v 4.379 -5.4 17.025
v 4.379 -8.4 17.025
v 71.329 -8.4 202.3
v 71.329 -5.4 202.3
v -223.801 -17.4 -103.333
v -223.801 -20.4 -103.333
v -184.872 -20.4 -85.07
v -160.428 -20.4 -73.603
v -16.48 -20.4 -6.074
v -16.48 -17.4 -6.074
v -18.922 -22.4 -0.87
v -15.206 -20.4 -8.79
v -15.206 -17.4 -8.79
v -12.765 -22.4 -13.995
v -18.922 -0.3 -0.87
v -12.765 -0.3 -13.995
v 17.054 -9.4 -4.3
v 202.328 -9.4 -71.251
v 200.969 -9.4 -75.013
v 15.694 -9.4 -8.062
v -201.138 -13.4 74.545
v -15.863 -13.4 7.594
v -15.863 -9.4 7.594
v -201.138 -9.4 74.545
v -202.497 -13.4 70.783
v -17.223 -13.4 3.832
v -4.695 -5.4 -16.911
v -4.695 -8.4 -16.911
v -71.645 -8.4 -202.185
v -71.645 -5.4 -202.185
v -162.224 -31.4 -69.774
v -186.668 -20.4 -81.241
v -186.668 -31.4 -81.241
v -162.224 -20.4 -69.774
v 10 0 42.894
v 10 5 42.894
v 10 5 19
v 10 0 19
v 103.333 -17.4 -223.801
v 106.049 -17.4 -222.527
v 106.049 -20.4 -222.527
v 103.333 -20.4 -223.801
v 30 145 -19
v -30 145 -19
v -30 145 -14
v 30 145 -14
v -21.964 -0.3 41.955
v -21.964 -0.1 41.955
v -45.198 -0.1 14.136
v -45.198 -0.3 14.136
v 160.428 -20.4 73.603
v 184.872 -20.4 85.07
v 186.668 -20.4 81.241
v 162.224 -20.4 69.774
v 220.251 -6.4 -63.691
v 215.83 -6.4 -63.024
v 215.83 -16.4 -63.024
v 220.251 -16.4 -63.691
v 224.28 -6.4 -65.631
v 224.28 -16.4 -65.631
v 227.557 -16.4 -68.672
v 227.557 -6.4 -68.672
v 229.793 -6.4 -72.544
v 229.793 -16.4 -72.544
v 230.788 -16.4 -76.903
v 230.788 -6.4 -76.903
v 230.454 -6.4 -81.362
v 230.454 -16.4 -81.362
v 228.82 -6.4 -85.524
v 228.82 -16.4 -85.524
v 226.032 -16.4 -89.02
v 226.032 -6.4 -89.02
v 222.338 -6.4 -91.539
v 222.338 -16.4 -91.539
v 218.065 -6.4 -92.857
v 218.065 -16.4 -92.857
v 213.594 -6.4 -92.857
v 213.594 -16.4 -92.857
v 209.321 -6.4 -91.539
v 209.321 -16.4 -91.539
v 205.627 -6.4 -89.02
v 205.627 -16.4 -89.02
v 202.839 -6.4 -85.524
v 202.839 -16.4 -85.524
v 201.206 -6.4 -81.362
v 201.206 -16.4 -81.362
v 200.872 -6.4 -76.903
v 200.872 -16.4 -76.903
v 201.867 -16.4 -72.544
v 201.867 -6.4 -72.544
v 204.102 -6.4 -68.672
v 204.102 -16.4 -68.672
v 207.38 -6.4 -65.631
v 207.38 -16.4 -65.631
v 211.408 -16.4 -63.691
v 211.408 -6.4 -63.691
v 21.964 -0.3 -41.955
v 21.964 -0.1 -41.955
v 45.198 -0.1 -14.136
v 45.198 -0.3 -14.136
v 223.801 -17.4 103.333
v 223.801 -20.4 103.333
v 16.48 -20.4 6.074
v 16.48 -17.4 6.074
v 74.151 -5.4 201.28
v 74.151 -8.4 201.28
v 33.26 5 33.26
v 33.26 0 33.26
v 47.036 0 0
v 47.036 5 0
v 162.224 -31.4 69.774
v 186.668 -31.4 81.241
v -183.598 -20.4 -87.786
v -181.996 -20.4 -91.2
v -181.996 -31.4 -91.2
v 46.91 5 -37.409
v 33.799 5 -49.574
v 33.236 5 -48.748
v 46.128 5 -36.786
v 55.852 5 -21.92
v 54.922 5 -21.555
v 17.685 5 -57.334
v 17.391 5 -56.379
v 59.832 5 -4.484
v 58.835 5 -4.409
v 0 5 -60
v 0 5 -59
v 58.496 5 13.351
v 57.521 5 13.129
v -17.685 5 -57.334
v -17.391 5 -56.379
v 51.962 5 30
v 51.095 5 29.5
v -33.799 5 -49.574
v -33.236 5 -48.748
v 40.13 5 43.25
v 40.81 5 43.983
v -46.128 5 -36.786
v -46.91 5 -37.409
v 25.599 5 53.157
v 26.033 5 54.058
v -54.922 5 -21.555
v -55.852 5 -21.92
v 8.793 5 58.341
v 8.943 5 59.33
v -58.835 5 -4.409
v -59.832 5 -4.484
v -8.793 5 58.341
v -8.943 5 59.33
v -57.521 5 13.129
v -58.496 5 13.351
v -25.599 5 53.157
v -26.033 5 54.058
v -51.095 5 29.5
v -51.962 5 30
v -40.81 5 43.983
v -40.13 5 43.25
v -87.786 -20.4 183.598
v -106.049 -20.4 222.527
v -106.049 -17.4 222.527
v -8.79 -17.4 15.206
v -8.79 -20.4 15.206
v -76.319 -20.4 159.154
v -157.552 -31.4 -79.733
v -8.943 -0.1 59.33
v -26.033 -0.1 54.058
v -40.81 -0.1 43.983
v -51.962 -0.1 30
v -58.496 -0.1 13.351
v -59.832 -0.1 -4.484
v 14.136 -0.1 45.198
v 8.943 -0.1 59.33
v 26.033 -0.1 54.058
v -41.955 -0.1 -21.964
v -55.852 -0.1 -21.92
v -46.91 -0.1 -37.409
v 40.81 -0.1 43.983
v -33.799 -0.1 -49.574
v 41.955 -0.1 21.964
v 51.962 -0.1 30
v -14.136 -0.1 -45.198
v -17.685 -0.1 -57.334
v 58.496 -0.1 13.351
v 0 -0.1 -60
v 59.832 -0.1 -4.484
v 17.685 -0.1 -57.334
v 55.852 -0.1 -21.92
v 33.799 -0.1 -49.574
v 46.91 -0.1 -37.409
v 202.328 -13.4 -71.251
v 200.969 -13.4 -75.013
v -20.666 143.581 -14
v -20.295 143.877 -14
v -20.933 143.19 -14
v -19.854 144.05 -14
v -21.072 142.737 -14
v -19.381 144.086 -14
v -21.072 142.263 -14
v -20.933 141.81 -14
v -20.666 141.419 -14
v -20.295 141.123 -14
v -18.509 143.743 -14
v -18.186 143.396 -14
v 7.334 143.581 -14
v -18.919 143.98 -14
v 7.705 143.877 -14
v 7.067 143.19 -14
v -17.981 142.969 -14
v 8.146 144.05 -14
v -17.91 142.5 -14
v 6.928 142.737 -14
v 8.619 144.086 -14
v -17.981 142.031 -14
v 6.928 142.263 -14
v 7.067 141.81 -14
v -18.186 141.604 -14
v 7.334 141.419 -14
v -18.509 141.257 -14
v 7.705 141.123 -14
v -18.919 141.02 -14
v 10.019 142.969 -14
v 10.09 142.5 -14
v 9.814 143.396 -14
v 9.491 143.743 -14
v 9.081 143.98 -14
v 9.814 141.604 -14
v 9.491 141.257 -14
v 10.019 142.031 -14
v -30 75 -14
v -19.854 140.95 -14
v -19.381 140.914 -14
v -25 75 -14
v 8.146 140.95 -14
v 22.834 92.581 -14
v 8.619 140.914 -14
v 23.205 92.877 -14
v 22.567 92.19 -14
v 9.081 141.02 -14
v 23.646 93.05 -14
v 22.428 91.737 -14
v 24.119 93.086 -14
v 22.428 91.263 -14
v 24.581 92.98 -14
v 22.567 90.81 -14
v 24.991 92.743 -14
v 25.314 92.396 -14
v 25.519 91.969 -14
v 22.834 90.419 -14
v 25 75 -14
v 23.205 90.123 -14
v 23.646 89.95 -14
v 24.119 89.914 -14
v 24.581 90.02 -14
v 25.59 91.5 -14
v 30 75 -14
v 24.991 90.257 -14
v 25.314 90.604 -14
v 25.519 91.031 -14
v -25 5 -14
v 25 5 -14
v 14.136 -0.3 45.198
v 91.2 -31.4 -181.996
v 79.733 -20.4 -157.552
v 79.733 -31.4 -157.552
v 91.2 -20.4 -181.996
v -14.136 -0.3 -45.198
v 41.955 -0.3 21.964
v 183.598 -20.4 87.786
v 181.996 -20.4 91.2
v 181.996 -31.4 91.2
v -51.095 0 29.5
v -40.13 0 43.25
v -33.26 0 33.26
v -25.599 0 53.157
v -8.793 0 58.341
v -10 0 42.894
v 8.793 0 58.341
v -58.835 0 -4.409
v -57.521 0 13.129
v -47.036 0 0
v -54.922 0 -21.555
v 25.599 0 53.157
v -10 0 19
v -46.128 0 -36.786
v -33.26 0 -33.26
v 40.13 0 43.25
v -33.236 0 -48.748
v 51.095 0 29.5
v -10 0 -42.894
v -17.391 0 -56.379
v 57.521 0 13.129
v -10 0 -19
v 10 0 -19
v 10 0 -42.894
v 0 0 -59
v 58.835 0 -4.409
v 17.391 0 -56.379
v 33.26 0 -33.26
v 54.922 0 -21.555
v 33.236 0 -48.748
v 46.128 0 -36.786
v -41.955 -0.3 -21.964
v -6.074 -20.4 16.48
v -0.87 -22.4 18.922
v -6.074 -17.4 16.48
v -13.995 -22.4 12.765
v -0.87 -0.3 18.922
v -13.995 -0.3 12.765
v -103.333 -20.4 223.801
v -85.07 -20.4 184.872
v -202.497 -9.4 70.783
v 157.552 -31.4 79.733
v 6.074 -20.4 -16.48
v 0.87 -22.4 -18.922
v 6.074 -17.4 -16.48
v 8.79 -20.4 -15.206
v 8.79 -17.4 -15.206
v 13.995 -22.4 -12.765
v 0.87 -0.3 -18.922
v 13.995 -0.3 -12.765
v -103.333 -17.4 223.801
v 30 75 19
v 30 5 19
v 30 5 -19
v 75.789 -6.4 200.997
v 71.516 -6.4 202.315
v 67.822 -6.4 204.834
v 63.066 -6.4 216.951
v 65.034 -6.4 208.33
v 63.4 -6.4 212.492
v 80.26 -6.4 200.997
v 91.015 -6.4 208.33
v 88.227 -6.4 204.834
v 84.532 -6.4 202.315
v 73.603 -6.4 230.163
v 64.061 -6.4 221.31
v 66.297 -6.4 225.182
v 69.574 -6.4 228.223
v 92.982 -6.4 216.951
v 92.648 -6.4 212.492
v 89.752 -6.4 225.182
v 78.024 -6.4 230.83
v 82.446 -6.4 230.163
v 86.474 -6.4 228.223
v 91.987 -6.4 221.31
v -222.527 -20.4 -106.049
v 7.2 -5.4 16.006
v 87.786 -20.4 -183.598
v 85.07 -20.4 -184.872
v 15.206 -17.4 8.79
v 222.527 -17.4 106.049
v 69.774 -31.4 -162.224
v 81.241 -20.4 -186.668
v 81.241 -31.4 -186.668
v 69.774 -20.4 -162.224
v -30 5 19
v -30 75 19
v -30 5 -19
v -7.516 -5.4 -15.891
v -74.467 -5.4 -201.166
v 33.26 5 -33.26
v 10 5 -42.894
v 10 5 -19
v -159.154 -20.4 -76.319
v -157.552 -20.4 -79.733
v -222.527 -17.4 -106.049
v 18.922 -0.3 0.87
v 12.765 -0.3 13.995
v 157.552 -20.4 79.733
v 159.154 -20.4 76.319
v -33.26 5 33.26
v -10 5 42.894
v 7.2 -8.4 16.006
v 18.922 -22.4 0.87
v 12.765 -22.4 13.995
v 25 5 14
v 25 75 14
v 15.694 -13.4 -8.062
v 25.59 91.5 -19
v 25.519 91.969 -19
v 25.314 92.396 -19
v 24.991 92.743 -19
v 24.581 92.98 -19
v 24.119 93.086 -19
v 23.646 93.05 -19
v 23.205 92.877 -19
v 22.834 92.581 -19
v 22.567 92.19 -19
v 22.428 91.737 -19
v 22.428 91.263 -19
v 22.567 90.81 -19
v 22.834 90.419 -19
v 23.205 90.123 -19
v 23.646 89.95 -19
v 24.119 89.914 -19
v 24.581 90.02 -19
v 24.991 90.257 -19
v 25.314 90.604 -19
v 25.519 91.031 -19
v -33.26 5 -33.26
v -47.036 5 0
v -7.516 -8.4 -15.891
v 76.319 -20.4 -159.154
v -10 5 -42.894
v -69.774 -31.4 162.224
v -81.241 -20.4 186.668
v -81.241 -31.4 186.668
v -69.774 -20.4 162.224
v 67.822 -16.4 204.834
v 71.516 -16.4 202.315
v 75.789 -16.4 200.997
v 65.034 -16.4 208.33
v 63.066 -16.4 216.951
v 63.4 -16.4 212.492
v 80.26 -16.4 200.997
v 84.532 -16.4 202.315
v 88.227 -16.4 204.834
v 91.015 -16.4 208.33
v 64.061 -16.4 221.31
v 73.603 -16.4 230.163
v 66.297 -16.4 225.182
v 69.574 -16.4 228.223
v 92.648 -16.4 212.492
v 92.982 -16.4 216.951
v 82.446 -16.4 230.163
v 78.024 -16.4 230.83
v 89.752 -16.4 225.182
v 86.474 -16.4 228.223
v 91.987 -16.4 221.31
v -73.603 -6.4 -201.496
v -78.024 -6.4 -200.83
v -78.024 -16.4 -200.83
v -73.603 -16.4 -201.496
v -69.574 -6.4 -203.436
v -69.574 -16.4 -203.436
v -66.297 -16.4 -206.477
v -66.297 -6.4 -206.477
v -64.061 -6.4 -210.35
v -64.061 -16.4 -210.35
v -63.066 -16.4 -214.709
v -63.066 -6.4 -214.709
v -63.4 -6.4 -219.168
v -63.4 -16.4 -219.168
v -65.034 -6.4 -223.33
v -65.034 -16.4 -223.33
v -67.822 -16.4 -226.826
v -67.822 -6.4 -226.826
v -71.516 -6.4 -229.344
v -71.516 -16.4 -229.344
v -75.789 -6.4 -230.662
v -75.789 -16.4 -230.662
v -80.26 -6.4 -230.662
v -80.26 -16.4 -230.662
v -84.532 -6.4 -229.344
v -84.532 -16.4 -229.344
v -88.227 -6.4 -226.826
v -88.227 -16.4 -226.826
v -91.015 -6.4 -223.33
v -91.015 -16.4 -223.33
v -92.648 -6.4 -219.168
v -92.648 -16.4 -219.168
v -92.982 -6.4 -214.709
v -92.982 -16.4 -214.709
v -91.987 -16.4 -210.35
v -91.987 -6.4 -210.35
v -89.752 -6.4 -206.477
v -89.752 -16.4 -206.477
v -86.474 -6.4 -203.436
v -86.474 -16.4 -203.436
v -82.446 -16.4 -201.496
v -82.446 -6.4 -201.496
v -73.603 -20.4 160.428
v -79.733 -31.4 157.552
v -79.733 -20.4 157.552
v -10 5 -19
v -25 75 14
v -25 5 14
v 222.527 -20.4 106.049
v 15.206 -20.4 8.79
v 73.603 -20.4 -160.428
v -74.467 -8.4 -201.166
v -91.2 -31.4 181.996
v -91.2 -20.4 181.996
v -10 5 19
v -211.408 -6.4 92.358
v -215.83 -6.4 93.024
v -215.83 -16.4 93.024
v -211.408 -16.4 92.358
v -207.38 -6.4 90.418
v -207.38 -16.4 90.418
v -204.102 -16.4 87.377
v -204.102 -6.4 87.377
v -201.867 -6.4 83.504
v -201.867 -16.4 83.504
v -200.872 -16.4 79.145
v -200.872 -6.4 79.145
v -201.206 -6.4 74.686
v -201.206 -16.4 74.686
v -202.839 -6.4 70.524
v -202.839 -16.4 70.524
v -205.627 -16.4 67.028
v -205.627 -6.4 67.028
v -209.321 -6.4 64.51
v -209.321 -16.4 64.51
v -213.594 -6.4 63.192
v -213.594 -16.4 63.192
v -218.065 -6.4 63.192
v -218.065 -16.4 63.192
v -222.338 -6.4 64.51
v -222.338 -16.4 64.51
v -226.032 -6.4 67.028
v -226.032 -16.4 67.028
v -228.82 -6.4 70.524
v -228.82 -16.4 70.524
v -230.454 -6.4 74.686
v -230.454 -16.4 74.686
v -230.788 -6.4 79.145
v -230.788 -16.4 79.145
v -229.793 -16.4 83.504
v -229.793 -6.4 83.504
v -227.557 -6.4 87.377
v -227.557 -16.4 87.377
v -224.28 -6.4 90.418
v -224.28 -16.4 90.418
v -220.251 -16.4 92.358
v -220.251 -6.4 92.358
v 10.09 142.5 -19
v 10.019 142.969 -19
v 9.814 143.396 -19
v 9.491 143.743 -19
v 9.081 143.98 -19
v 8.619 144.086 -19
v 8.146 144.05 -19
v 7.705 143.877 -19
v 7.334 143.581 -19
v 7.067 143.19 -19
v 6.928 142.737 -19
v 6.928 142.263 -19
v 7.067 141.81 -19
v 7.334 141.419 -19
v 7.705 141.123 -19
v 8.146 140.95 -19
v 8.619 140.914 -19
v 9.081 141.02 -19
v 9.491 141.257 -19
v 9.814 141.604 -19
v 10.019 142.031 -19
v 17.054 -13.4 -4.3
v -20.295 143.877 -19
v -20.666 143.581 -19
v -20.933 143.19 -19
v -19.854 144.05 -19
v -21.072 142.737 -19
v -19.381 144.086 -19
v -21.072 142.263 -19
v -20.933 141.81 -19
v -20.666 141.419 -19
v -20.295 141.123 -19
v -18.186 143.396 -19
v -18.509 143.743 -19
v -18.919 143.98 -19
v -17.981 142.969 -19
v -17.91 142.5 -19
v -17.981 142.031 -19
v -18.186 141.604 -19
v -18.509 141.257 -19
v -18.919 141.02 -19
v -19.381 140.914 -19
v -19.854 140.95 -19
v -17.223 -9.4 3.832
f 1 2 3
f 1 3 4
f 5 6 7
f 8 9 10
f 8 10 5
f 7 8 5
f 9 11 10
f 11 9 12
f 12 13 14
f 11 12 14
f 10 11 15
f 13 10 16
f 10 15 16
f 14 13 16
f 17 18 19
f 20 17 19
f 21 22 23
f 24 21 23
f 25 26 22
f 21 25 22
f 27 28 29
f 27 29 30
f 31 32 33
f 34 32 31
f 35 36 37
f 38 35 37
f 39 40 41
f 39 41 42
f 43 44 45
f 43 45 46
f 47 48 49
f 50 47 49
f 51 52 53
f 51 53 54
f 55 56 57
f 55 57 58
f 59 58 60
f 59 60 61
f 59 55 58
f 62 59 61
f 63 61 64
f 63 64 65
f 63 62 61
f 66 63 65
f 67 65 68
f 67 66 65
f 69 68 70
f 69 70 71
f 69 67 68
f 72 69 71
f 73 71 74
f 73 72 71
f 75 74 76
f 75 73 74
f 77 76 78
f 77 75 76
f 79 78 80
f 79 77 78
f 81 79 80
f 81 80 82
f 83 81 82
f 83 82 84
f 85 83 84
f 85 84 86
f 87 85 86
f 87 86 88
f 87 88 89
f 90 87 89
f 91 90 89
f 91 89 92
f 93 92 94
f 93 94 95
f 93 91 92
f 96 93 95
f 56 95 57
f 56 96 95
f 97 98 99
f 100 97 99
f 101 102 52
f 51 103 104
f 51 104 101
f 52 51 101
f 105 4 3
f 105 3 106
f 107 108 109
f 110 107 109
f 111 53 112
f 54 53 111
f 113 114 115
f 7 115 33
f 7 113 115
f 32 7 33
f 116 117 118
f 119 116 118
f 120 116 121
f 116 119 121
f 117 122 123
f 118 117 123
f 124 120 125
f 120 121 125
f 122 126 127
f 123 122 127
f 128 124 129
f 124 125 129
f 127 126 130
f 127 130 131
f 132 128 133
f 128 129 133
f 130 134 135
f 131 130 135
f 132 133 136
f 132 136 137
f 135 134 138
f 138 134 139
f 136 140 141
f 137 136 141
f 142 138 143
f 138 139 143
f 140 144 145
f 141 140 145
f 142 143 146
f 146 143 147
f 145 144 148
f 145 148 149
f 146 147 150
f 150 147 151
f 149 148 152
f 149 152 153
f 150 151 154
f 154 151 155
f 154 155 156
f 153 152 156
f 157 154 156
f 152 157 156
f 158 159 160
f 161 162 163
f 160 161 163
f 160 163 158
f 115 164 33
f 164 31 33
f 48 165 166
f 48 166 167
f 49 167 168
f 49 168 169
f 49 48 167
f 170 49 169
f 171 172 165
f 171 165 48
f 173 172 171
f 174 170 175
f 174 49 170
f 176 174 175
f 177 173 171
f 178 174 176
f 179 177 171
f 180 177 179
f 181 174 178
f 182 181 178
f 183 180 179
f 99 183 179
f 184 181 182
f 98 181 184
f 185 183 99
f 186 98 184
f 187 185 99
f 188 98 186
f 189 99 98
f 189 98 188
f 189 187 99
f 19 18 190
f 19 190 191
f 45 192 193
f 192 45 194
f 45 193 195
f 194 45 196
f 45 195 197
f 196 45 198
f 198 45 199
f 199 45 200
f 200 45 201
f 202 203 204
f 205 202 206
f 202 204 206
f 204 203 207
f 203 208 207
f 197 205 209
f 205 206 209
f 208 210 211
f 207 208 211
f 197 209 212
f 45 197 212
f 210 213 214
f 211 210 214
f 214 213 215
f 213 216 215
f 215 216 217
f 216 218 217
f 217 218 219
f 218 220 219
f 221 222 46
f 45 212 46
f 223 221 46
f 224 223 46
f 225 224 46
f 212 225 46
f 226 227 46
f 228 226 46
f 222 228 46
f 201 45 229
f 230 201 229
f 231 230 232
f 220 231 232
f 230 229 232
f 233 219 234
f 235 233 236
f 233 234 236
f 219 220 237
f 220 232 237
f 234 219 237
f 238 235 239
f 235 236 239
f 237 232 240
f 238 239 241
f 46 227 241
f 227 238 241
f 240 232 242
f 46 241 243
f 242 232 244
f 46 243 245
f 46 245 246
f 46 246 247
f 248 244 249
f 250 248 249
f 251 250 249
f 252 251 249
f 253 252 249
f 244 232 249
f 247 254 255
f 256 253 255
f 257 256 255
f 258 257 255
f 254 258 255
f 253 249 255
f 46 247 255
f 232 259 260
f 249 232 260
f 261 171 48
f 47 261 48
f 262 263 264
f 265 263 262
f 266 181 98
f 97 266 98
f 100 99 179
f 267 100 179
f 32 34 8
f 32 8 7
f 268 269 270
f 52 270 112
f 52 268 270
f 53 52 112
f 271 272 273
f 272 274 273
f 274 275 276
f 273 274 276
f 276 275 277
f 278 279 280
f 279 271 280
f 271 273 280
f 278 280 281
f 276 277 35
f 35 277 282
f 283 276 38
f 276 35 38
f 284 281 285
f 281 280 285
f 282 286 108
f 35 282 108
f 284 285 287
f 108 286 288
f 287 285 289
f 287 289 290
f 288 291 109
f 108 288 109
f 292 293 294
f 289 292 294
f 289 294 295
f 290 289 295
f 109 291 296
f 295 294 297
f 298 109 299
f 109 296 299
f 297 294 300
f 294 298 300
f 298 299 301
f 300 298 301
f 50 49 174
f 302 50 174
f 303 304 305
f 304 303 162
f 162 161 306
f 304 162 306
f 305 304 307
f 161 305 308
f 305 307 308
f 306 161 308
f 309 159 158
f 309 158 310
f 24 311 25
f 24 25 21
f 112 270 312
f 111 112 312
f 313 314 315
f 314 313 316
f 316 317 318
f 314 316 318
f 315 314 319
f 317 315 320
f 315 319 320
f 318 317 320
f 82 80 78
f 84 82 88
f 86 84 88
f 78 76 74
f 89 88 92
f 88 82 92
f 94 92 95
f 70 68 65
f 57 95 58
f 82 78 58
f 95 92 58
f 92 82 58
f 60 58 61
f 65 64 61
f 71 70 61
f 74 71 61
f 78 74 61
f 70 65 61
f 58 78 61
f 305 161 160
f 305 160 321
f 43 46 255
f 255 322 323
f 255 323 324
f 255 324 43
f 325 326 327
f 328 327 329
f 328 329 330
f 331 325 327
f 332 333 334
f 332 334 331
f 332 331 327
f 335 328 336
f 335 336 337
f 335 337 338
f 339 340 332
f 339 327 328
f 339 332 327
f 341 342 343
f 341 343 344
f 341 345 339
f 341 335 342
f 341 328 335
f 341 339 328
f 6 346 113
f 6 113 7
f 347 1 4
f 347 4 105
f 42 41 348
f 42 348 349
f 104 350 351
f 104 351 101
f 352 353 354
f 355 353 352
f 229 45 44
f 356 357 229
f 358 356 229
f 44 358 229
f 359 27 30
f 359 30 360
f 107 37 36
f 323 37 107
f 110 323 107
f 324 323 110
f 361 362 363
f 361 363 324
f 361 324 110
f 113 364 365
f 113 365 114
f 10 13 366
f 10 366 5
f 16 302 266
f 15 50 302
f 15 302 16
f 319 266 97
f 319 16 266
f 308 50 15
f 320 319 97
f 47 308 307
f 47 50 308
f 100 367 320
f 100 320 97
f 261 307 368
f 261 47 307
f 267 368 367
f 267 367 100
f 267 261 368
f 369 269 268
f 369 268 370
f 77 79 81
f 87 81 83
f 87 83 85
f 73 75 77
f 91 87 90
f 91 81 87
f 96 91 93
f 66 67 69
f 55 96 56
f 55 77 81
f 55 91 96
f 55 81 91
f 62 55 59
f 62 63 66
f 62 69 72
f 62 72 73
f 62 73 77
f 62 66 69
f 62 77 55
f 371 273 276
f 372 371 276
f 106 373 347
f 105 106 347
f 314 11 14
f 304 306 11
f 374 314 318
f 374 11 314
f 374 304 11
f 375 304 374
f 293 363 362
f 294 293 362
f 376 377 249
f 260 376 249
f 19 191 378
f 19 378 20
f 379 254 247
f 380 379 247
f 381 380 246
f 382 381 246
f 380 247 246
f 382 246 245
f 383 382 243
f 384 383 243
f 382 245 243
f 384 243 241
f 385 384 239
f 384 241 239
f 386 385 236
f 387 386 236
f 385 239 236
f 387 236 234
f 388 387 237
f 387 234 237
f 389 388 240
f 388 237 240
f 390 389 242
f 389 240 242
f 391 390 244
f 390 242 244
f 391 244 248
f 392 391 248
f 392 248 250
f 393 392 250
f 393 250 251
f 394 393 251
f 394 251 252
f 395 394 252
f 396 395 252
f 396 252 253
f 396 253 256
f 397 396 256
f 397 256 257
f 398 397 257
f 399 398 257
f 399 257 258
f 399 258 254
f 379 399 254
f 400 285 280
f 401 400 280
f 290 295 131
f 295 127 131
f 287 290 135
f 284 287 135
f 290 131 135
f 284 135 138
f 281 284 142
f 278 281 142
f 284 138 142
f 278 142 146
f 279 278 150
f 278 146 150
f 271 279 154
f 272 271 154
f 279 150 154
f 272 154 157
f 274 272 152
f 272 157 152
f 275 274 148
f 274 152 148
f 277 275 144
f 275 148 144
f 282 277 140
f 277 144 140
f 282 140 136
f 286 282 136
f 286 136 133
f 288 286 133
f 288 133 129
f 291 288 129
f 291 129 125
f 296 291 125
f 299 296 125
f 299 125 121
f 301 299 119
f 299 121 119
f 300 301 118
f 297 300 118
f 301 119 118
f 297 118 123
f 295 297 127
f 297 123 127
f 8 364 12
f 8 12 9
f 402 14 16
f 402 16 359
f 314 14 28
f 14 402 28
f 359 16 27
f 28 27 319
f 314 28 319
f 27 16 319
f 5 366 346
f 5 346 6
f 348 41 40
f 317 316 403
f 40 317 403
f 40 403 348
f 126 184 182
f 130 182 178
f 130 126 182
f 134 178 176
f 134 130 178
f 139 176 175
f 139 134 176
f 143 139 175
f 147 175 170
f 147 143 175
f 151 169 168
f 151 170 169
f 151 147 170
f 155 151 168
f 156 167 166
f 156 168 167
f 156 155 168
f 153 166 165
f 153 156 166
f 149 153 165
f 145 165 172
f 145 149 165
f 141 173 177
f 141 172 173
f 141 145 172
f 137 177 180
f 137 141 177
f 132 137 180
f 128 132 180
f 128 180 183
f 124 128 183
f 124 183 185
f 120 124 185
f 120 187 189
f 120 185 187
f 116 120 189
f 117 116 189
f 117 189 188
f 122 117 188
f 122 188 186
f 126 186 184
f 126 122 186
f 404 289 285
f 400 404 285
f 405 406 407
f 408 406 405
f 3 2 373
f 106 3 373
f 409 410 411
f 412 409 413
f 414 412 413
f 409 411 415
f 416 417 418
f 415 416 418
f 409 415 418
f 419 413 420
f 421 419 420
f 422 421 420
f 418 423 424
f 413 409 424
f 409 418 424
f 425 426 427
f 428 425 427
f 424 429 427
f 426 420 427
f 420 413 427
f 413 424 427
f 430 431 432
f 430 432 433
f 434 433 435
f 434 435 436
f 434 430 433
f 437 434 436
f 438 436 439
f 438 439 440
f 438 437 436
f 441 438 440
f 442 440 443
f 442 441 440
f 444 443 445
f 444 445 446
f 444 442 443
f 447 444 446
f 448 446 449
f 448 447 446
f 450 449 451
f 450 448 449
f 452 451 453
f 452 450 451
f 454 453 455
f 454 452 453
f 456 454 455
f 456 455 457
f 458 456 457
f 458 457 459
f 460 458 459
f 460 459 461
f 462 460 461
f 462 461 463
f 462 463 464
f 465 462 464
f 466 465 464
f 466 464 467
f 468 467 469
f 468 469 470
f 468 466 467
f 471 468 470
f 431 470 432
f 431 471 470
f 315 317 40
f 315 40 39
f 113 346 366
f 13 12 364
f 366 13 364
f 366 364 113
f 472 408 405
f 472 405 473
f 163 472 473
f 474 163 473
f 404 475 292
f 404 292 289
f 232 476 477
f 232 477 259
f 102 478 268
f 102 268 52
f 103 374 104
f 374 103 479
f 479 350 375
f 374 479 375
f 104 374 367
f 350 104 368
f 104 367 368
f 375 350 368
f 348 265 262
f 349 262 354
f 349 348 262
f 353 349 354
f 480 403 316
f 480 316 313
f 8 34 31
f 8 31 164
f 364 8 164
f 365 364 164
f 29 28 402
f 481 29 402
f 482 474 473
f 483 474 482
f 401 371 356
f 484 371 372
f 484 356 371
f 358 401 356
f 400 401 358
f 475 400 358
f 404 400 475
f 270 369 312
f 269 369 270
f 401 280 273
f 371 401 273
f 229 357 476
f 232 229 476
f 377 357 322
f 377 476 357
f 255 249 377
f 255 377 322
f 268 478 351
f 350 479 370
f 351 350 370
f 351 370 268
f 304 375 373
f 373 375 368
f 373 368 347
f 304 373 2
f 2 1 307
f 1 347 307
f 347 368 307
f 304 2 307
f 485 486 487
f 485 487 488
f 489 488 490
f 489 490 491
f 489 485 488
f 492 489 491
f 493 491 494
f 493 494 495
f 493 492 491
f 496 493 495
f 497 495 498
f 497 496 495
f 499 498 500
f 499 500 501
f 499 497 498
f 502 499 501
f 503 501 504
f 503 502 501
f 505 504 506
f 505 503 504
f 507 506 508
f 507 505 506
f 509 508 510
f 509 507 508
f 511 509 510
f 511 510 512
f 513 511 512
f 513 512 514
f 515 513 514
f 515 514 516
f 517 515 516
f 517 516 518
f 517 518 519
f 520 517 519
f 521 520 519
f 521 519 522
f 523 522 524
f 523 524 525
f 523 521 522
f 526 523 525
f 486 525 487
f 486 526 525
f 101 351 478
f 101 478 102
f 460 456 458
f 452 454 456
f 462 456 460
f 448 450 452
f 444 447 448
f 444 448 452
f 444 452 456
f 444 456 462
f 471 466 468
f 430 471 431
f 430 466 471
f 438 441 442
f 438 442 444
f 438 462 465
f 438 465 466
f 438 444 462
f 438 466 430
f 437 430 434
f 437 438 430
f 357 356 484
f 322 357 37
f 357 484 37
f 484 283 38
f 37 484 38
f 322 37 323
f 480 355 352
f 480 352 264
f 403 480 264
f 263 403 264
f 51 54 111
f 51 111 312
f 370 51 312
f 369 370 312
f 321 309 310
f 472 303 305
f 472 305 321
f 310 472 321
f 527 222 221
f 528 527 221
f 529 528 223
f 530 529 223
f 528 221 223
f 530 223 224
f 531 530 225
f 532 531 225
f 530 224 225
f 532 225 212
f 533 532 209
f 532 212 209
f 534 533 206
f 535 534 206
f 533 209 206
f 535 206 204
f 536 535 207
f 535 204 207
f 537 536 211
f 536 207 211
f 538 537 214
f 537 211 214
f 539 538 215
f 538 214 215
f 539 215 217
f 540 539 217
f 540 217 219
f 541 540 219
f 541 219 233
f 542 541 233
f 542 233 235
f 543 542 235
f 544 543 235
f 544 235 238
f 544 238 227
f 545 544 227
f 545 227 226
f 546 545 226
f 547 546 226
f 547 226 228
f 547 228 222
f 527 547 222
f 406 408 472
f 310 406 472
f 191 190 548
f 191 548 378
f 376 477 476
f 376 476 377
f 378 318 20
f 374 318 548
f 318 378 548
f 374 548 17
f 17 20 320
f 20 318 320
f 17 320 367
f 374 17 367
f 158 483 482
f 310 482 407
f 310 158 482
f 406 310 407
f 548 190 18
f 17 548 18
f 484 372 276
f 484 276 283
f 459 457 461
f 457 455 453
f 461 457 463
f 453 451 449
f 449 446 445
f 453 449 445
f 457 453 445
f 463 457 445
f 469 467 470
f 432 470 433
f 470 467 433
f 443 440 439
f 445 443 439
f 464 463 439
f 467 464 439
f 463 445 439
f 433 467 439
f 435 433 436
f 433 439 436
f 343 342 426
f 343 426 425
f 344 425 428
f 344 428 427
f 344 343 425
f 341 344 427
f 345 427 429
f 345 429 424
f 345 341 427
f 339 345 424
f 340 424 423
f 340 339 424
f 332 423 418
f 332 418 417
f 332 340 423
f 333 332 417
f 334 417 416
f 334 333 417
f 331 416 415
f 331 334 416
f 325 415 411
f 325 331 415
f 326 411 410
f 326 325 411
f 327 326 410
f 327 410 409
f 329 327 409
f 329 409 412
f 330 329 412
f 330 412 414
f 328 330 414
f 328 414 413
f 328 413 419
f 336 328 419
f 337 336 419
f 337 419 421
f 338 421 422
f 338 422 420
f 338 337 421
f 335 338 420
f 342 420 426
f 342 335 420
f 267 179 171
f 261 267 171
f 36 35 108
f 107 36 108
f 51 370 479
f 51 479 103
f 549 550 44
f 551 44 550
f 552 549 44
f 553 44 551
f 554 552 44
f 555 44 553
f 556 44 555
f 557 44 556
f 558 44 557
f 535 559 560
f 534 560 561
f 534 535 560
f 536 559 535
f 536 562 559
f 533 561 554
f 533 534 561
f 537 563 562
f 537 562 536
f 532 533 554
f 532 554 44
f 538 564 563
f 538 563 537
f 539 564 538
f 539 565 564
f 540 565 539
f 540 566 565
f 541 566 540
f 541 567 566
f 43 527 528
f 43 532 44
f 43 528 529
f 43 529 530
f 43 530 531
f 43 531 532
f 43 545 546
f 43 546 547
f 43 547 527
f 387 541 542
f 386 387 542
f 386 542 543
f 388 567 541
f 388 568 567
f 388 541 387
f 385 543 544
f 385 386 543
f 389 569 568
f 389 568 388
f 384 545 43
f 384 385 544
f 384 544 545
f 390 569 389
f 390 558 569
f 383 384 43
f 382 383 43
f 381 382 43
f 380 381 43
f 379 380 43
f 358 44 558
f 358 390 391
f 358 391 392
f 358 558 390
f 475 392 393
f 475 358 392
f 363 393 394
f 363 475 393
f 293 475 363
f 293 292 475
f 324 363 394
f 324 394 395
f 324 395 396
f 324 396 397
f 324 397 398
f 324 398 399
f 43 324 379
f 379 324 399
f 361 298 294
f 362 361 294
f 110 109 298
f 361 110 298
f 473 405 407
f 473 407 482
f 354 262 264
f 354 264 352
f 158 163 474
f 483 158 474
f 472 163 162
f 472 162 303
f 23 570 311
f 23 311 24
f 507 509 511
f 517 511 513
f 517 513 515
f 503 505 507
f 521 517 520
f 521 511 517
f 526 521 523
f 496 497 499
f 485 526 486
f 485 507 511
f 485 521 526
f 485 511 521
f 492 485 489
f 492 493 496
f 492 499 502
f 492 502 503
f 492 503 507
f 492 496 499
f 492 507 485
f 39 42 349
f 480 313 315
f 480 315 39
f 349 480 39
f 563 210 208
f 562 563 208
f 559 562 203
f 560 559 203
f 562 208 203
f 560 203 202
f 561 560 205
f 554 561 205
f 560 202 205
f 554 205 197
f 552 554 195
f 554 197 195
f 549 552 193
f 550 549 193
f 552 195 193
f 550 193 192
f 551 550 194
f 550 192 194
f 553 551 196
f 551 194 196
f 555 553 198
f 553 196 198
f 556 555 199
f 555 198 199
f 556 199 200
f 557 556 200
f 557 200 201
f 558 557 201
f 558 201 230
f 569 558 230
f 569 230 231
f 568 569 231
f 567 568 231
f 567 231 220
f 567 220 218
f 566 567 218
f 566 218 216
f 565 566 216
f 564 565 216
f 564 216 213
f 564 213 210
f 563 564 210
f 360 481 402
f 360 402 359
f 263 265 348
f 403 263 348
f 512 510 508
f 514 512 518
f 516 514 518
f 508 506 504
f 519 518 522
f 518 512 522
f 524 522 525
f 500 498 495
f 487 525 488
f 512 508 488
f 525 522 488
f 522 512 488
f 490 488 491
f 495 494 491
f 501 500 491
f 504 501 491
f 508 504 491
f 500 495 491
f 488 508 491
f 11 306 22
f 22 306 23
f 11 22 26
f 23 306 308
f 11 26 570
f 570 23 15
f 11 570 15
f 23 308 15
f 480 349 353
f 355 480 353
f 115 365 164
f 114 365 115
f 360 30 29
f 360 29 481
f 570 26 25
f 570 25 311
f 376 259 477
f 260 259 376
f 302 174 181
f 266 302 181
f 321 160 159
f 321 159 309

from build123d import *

# Parameters (mm, degrees)
CROQUIS1_W                 = 56
CROQUIS1_H                 = 34
CROQUIS1_W_2               = 50
CROQUIS1_H_2               = 28
SALIENTE_EXTRUIR1_DEPTH    = 5
CROQUIS2_W                 = 60
CROQUIS2_H                 = 38
CROQUIS2_W_2               = 50
CROQUIS2_H_2               = 28
SALIENTE_EXTRUIR2_DEPTH    = 70
CROQUIS4_W                 = 60
CROQUIS4_H                 = 5
SALIENTE_EXTRUIR4_DEPTH    = 70
CROQUIS5_R                 = 1.59
CORTAR_EXTRUIR1_DEPTH      = 165.203642607
CROQUIS6_W                 = 20
CROQUIS6_H                 = 30
CORTAR_EXTRUIR2_DEPTH      = 155.99942186
CROQUIS7_R                 = 60
SALIENTE_EXTRUIR5_DEPTH    = 0.1
CROQUIS9_W                 = 1
CROQUIS9_H                 = 5
SALIENTE_EXTRUIR6_DEPTH    = 0.2
SALIENTE_EXTRUIR7_DEPTH    = 22.1
CROQUIS12_W                = 3
CROQUIS12_H                = 3
SALIENTE_EXTRUIR8_DEPTH    = 197
CROQUIS13_W                = 3
CROQUIS13_H                = 3
SALIENTE_EXTRUIR9_DEPTH    = 197
CROQUIS14_W                = 4
CROQUIS14_H                = 4
SALIENTE_EXTRUIR10_DEPTH   = 197
CROQUIS15_W                = 4
CROQUIS15_H                = 4
SALIENTE_EXTRUIR12_DEPTH   = 197
CROQUIS17_R                = 15
SALIENTE_EXTRUIR13_DEPTH   = 10
SALIENTE_EXTRUIR13_2_DEPTH = 10
SALIENTE_EXTRUIR13_3_DEPTH = 10
SALIENTE_EXTRUIR13_4_DEPTH = 10
CROQUIS18_W                = 3
CROQUIS18_H                = 3
SALIENTE_EXTRUIR14_DEPTH   = 229
CROQUIS19_W                = 3
CROQUIS19_H                = 3
SALIENTE_EXTRUIR15_DEPTH   = 229
CROQUIS20_W                = 3
CROQUIS20_H                = 3
SALIENTE_EXTRUIR16_DEPTH   = 229
CROQUIS21_W                = 3
CROQUIS21_H                = 3
SALIENTE_EXTRUIR17_DEPTH   = 229
SALIENTE_EXTRUIR18_DEPTH   = 11


with BuildPart() as part:
    # Croquis1 → Saliente-Extruir1 (new body)
    # profile 1 of 3: a face of its own
    with BuildSketch(Plane(origin=(0, 0, 0), x_dir=(1, 0, 0), z_dir=(0, 1, 0))):
        Polygon((0, -47.036266736), (33.25966317, -33.25966317), (47.036266736, 0), (33.25966317, 33.25966317), (0, 47.036266736), (-33.25966317, 33.25966317), (-47.036266736, 0), (-33.25966317, -33.25966317), align=None)
        Rectangle(CROQUIS1_W, CROQUIS1_H, mode=Mode.SUBTRACT)
    # profile 2 of 3: a face of its own
    with BuildSketch(Plane(origin=(0, 0, 0), x_dir=(1, 0, 0), z_dir=(0, 1, 0))):
        Rectangle(CROQUIS1_W, CROQUIS1_H)
        Rectangle(CROQUIS1_W_2, CROQUIS1_H_2, mode=Mode.SUBTRACT)
    # profile 3 of 3: a face of its own
    with BuildSketch(Plane(origin=(0, 0, 0), x_dir=(1, 0, 0), z_dir=(0, 1, 0))):
        Rectangle(CROQUIS1_W_2, CROQUIS1_H_2)
    extrude(amount=SALIENTE_EXTRUIR1_DEPTH)

    # Croquis2 → Saliente-Extruir2 (add)
    with BuildSketch(Plane(origin=(0, 5, 0), x_dir=(1, 0, 0), z_dir=(0, 1, 0))):
        Rectangle(CROQUIS2_W, CROQUIS2_H)
        Rectangle(CROQUIS2_W_2, CROQUIS2_H_2, mode=Mode.SUBTRACT)
    extrude(amount=SALIENTE_EXTRUIR2_DEPTH)

    # Croquis4 → Saliente-Extruir4 (add)
    with BuildSketch(Plane(origin=(0, 75, 0), x_dir=(1, 0, 0), z_dir=(0, 1, 0))):
        with Locations((0, 16.5)):
            Rectangle(CROQUIS4_W, CROQUIS4_H)
    extrude(amount=SALIENTE_EXTRUIR4_DEPTH)

    # Croquis5 → Cortar-Extruir1 (cut, through all)
    with BuildSketch(Plane.XY.offset(-14)):
        with Locations((-19.5, 142.5)):
            Circle(CROQUIS5_R)
        with Locations((24, 91.5)):
            Circle(CROQUIS5_R)
        with Locations((8.5, 142.5)):
            Circle(CROQUIS5_R)
    extrude(amount=-CORTAR_EXTRUIR1_DEPTH, mode=Mode.SUBTRACT)

    # Croquis6 → Cortar-Extruir2 (cut, through all)
    with BuildSketch(Plane(origin=(0, 5, 0), x_dir=(1, 0, 0), z_dir=(0, 1, 0))):
        with Locations((0, 34)):
            Rectangle(CROQUIS6_W, CROQUIS6_H)
        with Locations((0, -34)):
            Rectangle(CROQUIS6_W, CROQUIS6_H)
    extrude(amount=-CORTAR_EXTRUIR2_DEPTH, mode=Mode.SUBTRACT)

    # Croquis7 → Saliente-Extruir5 (add)
    with BuildSketch(Plane.XZ):
        with Locations(Location((0, 0, 0), (0, 0, 270))):
            Circle(CROQUIS7_R)
    extrude(amount=SALIENTE_EXTRUIR5_DEPTH)

    # Croquis9 → Revolución1 (revolve)
    with BuildSketch(Plane.XY, mode=Mode.PRIVATE) as revoluci_n1_sk:
        with Locations((59.5, 2.5)):
            Rectangle(CROQUIS9_W, CROQUIS9_H)
    revolve(revoluci_n1_sk.sketch.rotate(Axis((0, 0, 0), (0, 1, 0)), 90), axis=Axis((0, 0, 0), (0, 1, 0)))

    # Croquis10 → Saliente-Extruir6 (add)
    with BuildSketch(Plane.XZ.offset(0.1)):
        Polygon((-21.963806256, 41.955403169), (-45.197706432, 14.136193744), (-41.955403169, -21.963806256), (-14.136193744, -45.197706432), (21.963806256, -41.955403169), (45.197706432, -14.136193744), (41.955403169, 21.963806256), (14.136193744, 45.197706432), align=None)
    extrude(amount=SALIENTE_EXTRUIR6_DEPTH)

    # Croquis11 → Saliente-Extruir7 (add)
    with BuildSketch(Plane.XZ.offset(0.3)):
        Polygon((-18.921877938, -0.869901338), (-12.764675068, -13.994901338), (0.869901338, -18.921877938), (13.994901338, -12.764675068), (18.921877938, 0.869901338), (12.764675068, 13.994901338), (-0.869901338, 18.921877938), (-13.994901338, 12.764675068), align=None)
    extrude(amount=SALIENTE_EXTRUIR7_DEPTH)

    # Croquis12 → Saliente-Extruir8 (add)
    with BuildSketch(Plane(origin=(5.947386865, 0, 16.458389638), x_dir=(0.9404794078882311, 0, -0.33985067800168073), z_dir=(0.33985067800168073, 0, 0.9404794078882311))):
        with Locations((-0.168076696, -6.9)):
            Rectangle(CROQUIS12_W, CROQUIS12_H)
    extrude(amount=SALIENTE_EXTRUIR8_DEPTH)

    # Croquis13 → Saliente-Extruir9 (add)
    with BuildSketch(Plane(origin=(-5.947386865, 0, -16.458389638), x_dir=(-0.9404794078882313, 0, 0.33985067800168045), z_dir=(-0.33985067800168045, 0, -0.9404794078882313))):
        with Locations((0.168076696, -6.9)):
            Rectangle(CROQUIS13_W, CROQUIS13_H)
    extrude(amount=SALIENTE_EXTRUIR9_DEPTH)

    # Croquis14 → Saliente-Extruir10 (add)
    with BuildSketch(Plane(origin=(-16.458389638, 0, 5.947386865), x_dir=(0.33985067800168045, 0, 0.9404794078882313), z_dir=(-0.9404794078882313, 0, 0.33985067800168045))):
        with Locations((-0.248737342, -11.4)):
            Rectangle(CROQUIS14_W, CROQUIS14_H)
    extrude(amount=SALIENTE_EXTRUIR10_DEPTH)

    # Croquis15 → Saliente-Extruir12 (add)
    with BuildSketch(Plane(origin=(16.458389638, 0, -5.947386865), x_dir=(-0.3398506780016804, 0, -0.9404794078882313), z_dir=(0.9404794078882313, 0, -0.3398506780016804))):
        with Locations((0.248737342, -11.4)):
            Rectangle(CROQUIS15_W, CROQUIS15_H)
    extrude(amount=SALIENTE_EXTRUIR12_DEPTH)

    # Croquis18 → Saliente-Extruir14 (add)
    with BuildSketch(Plane(origin=(7.432401338, 0, -15.843276503), x_dir=(-0.9053300858899115, 0, -0.4247086478782432), z_dir=(0.42470864787824314, 0, -0.9053300858899114))):
        with Locations((0, -18.9)):
            Rectangle(CROQUIS18_W, CROQUIS18_H)
    extrude(amount=SALIENTE_EXTRUIR14_DEPTH)

    # Croquis19 → Saliente-Extruir15 (add)
    with BuildSketch(Plane(origin=(-7.432401338, 0, 15.843276503), x_dir=(0.9053300858899115, 0, 0.42470864787824314), z_dir=(-0.42470864787824314, 0, 0.9053300858899115))):
        with Locations((0, -18.9)):
            Rectangle(CROQUIS19_W, CROQUIS19_H)
    extrude(amount=SALIENTE_EXTRUIR15_DEPTH)

    # Croquis20 → Saliente-Extruir16 (add)
    with BuildSketch(Plane(origin=(15.843276503, 0, 7.432401338), x_dir=(0.42470864787824314, 0, -0.9053300858899115), z_dir=(0.9053300858899115, 0, 0.42470864787824314))):
        with Locations((0, -18.9)):
            Rectangle(CROQUIS20_W, CROQUIS20_H)
    extrude(amount=SALIENTE_EXTRUIR16_DEPTH)

    # Croquis21 → Saliente-Extruir17 (add)
    with BuildSketch(Plane(origin=(-15.843276503, 0, -7.432401338), x_dir=(-0.4247086478782432, 0, 0.9053300858899115), z_dir=(-0.9053300858899114, 0, -0.42470864787824314))):
        with Locations((0, -18.9)):
            Rectangle(CROQUIS21_W, CROQUIS21_H)
    extrude(amount=SALIENTE_EXTRUIR17_DEPTH)

    # Croquis22 → Saliente-Extruir18 (add)
    with BuildSketch(Plane.XZ.offset(20.4)):
        Polygon((91.199799959, -181.99622308), (81.241169015, -186.668018206), (69.774035522, -162.224105887), (79.732666467, -157.552310761), align=None)
        Polygon((-157.552310761, -79.732666467), (-181.99622308, -91.199799959), (-186.668018206, -81.241169015), (-162.224105887, -69.774035522), align=None)
        Polygon((-79.732666467, 157.552310761), (-91.199799959, 181.99622308), (-81.241169015, 186.668018206), (-69.774035522, 162.224105887), align=None)
        Polygon((157.552310761, 79.732666467), (181.99622308, 91.199799959), (186.668018206, 81.241169015), (162.224105887, 69.774035522), align=None)
    extrude(amount=SALIENTE_EXTRUIR18_DEPTH)


with BuildPart() as body_2:
    # Croquis17 → Saliente-Extruir13 (new body)
    with BuildSketch(Plane(origin=(0, -6.4, 0), x_dir=(1, 0, 0), z_dir=(0, 1, 0))):
        with Locations(Location((-215.829723194, -78.024236649, 0), (0, 0, 270))):
            Circle(CROQUIS17_R)
    extrude(amount=-SALIENTE_EXTRUIR13_DEPTH)


with BuildPart() as body_3:
    # Croquis17 → Saliente-Extruir13 2 (new body)
    with BuildSketch(Plane(origin=(0, -6.4, 0), x_dir=(1, 0, 0), z_dir=(0, 1, 0))):
        with Locations(Location((-78.024236649, 215.829723194, 0), (0, 0, 270))):
            Circle(CROQUIS17_R)
    extrude(amount=-SALIENTE_EXTRUIR13_2_DEPTH)


with BuildPart() as body_4:
    # Croquis17 → Saliente-Extruir13 3 (new body)
    with BuildSketch(Plane(origin=(0, -6.4, 0), x_dir=(1, 0, 0), z_dir=(0, 1, 0))):
        with Locations(Location((215.829723194, 78.024236649, 0), (0, 0, 270))):
            Circle(CROQUIS17_R)
    extrude(amount=-SALIENTE_EXTRUIR13_3_DEPTH)


with BuildPart() as body_5:
    # Croquis17 → Saliente-Extruir13 4 (new body)
    with BuildSketch(Plane(origin=(0, -6.4, 0), x_dir=(1, 0, 0), z_dir=(0, 1, 0))):
        with Locations(Location((78.024236649, -215.829723194, 0), (0, 0, 270))):
            Circle(CROQUIS17_R)
    extrude(amount=-SALIENTE_EXTRUIR13_4_DEPTH)


solid = Compound([part.part, body_2.part, body_3.part, body_4.part, body_5.part])
